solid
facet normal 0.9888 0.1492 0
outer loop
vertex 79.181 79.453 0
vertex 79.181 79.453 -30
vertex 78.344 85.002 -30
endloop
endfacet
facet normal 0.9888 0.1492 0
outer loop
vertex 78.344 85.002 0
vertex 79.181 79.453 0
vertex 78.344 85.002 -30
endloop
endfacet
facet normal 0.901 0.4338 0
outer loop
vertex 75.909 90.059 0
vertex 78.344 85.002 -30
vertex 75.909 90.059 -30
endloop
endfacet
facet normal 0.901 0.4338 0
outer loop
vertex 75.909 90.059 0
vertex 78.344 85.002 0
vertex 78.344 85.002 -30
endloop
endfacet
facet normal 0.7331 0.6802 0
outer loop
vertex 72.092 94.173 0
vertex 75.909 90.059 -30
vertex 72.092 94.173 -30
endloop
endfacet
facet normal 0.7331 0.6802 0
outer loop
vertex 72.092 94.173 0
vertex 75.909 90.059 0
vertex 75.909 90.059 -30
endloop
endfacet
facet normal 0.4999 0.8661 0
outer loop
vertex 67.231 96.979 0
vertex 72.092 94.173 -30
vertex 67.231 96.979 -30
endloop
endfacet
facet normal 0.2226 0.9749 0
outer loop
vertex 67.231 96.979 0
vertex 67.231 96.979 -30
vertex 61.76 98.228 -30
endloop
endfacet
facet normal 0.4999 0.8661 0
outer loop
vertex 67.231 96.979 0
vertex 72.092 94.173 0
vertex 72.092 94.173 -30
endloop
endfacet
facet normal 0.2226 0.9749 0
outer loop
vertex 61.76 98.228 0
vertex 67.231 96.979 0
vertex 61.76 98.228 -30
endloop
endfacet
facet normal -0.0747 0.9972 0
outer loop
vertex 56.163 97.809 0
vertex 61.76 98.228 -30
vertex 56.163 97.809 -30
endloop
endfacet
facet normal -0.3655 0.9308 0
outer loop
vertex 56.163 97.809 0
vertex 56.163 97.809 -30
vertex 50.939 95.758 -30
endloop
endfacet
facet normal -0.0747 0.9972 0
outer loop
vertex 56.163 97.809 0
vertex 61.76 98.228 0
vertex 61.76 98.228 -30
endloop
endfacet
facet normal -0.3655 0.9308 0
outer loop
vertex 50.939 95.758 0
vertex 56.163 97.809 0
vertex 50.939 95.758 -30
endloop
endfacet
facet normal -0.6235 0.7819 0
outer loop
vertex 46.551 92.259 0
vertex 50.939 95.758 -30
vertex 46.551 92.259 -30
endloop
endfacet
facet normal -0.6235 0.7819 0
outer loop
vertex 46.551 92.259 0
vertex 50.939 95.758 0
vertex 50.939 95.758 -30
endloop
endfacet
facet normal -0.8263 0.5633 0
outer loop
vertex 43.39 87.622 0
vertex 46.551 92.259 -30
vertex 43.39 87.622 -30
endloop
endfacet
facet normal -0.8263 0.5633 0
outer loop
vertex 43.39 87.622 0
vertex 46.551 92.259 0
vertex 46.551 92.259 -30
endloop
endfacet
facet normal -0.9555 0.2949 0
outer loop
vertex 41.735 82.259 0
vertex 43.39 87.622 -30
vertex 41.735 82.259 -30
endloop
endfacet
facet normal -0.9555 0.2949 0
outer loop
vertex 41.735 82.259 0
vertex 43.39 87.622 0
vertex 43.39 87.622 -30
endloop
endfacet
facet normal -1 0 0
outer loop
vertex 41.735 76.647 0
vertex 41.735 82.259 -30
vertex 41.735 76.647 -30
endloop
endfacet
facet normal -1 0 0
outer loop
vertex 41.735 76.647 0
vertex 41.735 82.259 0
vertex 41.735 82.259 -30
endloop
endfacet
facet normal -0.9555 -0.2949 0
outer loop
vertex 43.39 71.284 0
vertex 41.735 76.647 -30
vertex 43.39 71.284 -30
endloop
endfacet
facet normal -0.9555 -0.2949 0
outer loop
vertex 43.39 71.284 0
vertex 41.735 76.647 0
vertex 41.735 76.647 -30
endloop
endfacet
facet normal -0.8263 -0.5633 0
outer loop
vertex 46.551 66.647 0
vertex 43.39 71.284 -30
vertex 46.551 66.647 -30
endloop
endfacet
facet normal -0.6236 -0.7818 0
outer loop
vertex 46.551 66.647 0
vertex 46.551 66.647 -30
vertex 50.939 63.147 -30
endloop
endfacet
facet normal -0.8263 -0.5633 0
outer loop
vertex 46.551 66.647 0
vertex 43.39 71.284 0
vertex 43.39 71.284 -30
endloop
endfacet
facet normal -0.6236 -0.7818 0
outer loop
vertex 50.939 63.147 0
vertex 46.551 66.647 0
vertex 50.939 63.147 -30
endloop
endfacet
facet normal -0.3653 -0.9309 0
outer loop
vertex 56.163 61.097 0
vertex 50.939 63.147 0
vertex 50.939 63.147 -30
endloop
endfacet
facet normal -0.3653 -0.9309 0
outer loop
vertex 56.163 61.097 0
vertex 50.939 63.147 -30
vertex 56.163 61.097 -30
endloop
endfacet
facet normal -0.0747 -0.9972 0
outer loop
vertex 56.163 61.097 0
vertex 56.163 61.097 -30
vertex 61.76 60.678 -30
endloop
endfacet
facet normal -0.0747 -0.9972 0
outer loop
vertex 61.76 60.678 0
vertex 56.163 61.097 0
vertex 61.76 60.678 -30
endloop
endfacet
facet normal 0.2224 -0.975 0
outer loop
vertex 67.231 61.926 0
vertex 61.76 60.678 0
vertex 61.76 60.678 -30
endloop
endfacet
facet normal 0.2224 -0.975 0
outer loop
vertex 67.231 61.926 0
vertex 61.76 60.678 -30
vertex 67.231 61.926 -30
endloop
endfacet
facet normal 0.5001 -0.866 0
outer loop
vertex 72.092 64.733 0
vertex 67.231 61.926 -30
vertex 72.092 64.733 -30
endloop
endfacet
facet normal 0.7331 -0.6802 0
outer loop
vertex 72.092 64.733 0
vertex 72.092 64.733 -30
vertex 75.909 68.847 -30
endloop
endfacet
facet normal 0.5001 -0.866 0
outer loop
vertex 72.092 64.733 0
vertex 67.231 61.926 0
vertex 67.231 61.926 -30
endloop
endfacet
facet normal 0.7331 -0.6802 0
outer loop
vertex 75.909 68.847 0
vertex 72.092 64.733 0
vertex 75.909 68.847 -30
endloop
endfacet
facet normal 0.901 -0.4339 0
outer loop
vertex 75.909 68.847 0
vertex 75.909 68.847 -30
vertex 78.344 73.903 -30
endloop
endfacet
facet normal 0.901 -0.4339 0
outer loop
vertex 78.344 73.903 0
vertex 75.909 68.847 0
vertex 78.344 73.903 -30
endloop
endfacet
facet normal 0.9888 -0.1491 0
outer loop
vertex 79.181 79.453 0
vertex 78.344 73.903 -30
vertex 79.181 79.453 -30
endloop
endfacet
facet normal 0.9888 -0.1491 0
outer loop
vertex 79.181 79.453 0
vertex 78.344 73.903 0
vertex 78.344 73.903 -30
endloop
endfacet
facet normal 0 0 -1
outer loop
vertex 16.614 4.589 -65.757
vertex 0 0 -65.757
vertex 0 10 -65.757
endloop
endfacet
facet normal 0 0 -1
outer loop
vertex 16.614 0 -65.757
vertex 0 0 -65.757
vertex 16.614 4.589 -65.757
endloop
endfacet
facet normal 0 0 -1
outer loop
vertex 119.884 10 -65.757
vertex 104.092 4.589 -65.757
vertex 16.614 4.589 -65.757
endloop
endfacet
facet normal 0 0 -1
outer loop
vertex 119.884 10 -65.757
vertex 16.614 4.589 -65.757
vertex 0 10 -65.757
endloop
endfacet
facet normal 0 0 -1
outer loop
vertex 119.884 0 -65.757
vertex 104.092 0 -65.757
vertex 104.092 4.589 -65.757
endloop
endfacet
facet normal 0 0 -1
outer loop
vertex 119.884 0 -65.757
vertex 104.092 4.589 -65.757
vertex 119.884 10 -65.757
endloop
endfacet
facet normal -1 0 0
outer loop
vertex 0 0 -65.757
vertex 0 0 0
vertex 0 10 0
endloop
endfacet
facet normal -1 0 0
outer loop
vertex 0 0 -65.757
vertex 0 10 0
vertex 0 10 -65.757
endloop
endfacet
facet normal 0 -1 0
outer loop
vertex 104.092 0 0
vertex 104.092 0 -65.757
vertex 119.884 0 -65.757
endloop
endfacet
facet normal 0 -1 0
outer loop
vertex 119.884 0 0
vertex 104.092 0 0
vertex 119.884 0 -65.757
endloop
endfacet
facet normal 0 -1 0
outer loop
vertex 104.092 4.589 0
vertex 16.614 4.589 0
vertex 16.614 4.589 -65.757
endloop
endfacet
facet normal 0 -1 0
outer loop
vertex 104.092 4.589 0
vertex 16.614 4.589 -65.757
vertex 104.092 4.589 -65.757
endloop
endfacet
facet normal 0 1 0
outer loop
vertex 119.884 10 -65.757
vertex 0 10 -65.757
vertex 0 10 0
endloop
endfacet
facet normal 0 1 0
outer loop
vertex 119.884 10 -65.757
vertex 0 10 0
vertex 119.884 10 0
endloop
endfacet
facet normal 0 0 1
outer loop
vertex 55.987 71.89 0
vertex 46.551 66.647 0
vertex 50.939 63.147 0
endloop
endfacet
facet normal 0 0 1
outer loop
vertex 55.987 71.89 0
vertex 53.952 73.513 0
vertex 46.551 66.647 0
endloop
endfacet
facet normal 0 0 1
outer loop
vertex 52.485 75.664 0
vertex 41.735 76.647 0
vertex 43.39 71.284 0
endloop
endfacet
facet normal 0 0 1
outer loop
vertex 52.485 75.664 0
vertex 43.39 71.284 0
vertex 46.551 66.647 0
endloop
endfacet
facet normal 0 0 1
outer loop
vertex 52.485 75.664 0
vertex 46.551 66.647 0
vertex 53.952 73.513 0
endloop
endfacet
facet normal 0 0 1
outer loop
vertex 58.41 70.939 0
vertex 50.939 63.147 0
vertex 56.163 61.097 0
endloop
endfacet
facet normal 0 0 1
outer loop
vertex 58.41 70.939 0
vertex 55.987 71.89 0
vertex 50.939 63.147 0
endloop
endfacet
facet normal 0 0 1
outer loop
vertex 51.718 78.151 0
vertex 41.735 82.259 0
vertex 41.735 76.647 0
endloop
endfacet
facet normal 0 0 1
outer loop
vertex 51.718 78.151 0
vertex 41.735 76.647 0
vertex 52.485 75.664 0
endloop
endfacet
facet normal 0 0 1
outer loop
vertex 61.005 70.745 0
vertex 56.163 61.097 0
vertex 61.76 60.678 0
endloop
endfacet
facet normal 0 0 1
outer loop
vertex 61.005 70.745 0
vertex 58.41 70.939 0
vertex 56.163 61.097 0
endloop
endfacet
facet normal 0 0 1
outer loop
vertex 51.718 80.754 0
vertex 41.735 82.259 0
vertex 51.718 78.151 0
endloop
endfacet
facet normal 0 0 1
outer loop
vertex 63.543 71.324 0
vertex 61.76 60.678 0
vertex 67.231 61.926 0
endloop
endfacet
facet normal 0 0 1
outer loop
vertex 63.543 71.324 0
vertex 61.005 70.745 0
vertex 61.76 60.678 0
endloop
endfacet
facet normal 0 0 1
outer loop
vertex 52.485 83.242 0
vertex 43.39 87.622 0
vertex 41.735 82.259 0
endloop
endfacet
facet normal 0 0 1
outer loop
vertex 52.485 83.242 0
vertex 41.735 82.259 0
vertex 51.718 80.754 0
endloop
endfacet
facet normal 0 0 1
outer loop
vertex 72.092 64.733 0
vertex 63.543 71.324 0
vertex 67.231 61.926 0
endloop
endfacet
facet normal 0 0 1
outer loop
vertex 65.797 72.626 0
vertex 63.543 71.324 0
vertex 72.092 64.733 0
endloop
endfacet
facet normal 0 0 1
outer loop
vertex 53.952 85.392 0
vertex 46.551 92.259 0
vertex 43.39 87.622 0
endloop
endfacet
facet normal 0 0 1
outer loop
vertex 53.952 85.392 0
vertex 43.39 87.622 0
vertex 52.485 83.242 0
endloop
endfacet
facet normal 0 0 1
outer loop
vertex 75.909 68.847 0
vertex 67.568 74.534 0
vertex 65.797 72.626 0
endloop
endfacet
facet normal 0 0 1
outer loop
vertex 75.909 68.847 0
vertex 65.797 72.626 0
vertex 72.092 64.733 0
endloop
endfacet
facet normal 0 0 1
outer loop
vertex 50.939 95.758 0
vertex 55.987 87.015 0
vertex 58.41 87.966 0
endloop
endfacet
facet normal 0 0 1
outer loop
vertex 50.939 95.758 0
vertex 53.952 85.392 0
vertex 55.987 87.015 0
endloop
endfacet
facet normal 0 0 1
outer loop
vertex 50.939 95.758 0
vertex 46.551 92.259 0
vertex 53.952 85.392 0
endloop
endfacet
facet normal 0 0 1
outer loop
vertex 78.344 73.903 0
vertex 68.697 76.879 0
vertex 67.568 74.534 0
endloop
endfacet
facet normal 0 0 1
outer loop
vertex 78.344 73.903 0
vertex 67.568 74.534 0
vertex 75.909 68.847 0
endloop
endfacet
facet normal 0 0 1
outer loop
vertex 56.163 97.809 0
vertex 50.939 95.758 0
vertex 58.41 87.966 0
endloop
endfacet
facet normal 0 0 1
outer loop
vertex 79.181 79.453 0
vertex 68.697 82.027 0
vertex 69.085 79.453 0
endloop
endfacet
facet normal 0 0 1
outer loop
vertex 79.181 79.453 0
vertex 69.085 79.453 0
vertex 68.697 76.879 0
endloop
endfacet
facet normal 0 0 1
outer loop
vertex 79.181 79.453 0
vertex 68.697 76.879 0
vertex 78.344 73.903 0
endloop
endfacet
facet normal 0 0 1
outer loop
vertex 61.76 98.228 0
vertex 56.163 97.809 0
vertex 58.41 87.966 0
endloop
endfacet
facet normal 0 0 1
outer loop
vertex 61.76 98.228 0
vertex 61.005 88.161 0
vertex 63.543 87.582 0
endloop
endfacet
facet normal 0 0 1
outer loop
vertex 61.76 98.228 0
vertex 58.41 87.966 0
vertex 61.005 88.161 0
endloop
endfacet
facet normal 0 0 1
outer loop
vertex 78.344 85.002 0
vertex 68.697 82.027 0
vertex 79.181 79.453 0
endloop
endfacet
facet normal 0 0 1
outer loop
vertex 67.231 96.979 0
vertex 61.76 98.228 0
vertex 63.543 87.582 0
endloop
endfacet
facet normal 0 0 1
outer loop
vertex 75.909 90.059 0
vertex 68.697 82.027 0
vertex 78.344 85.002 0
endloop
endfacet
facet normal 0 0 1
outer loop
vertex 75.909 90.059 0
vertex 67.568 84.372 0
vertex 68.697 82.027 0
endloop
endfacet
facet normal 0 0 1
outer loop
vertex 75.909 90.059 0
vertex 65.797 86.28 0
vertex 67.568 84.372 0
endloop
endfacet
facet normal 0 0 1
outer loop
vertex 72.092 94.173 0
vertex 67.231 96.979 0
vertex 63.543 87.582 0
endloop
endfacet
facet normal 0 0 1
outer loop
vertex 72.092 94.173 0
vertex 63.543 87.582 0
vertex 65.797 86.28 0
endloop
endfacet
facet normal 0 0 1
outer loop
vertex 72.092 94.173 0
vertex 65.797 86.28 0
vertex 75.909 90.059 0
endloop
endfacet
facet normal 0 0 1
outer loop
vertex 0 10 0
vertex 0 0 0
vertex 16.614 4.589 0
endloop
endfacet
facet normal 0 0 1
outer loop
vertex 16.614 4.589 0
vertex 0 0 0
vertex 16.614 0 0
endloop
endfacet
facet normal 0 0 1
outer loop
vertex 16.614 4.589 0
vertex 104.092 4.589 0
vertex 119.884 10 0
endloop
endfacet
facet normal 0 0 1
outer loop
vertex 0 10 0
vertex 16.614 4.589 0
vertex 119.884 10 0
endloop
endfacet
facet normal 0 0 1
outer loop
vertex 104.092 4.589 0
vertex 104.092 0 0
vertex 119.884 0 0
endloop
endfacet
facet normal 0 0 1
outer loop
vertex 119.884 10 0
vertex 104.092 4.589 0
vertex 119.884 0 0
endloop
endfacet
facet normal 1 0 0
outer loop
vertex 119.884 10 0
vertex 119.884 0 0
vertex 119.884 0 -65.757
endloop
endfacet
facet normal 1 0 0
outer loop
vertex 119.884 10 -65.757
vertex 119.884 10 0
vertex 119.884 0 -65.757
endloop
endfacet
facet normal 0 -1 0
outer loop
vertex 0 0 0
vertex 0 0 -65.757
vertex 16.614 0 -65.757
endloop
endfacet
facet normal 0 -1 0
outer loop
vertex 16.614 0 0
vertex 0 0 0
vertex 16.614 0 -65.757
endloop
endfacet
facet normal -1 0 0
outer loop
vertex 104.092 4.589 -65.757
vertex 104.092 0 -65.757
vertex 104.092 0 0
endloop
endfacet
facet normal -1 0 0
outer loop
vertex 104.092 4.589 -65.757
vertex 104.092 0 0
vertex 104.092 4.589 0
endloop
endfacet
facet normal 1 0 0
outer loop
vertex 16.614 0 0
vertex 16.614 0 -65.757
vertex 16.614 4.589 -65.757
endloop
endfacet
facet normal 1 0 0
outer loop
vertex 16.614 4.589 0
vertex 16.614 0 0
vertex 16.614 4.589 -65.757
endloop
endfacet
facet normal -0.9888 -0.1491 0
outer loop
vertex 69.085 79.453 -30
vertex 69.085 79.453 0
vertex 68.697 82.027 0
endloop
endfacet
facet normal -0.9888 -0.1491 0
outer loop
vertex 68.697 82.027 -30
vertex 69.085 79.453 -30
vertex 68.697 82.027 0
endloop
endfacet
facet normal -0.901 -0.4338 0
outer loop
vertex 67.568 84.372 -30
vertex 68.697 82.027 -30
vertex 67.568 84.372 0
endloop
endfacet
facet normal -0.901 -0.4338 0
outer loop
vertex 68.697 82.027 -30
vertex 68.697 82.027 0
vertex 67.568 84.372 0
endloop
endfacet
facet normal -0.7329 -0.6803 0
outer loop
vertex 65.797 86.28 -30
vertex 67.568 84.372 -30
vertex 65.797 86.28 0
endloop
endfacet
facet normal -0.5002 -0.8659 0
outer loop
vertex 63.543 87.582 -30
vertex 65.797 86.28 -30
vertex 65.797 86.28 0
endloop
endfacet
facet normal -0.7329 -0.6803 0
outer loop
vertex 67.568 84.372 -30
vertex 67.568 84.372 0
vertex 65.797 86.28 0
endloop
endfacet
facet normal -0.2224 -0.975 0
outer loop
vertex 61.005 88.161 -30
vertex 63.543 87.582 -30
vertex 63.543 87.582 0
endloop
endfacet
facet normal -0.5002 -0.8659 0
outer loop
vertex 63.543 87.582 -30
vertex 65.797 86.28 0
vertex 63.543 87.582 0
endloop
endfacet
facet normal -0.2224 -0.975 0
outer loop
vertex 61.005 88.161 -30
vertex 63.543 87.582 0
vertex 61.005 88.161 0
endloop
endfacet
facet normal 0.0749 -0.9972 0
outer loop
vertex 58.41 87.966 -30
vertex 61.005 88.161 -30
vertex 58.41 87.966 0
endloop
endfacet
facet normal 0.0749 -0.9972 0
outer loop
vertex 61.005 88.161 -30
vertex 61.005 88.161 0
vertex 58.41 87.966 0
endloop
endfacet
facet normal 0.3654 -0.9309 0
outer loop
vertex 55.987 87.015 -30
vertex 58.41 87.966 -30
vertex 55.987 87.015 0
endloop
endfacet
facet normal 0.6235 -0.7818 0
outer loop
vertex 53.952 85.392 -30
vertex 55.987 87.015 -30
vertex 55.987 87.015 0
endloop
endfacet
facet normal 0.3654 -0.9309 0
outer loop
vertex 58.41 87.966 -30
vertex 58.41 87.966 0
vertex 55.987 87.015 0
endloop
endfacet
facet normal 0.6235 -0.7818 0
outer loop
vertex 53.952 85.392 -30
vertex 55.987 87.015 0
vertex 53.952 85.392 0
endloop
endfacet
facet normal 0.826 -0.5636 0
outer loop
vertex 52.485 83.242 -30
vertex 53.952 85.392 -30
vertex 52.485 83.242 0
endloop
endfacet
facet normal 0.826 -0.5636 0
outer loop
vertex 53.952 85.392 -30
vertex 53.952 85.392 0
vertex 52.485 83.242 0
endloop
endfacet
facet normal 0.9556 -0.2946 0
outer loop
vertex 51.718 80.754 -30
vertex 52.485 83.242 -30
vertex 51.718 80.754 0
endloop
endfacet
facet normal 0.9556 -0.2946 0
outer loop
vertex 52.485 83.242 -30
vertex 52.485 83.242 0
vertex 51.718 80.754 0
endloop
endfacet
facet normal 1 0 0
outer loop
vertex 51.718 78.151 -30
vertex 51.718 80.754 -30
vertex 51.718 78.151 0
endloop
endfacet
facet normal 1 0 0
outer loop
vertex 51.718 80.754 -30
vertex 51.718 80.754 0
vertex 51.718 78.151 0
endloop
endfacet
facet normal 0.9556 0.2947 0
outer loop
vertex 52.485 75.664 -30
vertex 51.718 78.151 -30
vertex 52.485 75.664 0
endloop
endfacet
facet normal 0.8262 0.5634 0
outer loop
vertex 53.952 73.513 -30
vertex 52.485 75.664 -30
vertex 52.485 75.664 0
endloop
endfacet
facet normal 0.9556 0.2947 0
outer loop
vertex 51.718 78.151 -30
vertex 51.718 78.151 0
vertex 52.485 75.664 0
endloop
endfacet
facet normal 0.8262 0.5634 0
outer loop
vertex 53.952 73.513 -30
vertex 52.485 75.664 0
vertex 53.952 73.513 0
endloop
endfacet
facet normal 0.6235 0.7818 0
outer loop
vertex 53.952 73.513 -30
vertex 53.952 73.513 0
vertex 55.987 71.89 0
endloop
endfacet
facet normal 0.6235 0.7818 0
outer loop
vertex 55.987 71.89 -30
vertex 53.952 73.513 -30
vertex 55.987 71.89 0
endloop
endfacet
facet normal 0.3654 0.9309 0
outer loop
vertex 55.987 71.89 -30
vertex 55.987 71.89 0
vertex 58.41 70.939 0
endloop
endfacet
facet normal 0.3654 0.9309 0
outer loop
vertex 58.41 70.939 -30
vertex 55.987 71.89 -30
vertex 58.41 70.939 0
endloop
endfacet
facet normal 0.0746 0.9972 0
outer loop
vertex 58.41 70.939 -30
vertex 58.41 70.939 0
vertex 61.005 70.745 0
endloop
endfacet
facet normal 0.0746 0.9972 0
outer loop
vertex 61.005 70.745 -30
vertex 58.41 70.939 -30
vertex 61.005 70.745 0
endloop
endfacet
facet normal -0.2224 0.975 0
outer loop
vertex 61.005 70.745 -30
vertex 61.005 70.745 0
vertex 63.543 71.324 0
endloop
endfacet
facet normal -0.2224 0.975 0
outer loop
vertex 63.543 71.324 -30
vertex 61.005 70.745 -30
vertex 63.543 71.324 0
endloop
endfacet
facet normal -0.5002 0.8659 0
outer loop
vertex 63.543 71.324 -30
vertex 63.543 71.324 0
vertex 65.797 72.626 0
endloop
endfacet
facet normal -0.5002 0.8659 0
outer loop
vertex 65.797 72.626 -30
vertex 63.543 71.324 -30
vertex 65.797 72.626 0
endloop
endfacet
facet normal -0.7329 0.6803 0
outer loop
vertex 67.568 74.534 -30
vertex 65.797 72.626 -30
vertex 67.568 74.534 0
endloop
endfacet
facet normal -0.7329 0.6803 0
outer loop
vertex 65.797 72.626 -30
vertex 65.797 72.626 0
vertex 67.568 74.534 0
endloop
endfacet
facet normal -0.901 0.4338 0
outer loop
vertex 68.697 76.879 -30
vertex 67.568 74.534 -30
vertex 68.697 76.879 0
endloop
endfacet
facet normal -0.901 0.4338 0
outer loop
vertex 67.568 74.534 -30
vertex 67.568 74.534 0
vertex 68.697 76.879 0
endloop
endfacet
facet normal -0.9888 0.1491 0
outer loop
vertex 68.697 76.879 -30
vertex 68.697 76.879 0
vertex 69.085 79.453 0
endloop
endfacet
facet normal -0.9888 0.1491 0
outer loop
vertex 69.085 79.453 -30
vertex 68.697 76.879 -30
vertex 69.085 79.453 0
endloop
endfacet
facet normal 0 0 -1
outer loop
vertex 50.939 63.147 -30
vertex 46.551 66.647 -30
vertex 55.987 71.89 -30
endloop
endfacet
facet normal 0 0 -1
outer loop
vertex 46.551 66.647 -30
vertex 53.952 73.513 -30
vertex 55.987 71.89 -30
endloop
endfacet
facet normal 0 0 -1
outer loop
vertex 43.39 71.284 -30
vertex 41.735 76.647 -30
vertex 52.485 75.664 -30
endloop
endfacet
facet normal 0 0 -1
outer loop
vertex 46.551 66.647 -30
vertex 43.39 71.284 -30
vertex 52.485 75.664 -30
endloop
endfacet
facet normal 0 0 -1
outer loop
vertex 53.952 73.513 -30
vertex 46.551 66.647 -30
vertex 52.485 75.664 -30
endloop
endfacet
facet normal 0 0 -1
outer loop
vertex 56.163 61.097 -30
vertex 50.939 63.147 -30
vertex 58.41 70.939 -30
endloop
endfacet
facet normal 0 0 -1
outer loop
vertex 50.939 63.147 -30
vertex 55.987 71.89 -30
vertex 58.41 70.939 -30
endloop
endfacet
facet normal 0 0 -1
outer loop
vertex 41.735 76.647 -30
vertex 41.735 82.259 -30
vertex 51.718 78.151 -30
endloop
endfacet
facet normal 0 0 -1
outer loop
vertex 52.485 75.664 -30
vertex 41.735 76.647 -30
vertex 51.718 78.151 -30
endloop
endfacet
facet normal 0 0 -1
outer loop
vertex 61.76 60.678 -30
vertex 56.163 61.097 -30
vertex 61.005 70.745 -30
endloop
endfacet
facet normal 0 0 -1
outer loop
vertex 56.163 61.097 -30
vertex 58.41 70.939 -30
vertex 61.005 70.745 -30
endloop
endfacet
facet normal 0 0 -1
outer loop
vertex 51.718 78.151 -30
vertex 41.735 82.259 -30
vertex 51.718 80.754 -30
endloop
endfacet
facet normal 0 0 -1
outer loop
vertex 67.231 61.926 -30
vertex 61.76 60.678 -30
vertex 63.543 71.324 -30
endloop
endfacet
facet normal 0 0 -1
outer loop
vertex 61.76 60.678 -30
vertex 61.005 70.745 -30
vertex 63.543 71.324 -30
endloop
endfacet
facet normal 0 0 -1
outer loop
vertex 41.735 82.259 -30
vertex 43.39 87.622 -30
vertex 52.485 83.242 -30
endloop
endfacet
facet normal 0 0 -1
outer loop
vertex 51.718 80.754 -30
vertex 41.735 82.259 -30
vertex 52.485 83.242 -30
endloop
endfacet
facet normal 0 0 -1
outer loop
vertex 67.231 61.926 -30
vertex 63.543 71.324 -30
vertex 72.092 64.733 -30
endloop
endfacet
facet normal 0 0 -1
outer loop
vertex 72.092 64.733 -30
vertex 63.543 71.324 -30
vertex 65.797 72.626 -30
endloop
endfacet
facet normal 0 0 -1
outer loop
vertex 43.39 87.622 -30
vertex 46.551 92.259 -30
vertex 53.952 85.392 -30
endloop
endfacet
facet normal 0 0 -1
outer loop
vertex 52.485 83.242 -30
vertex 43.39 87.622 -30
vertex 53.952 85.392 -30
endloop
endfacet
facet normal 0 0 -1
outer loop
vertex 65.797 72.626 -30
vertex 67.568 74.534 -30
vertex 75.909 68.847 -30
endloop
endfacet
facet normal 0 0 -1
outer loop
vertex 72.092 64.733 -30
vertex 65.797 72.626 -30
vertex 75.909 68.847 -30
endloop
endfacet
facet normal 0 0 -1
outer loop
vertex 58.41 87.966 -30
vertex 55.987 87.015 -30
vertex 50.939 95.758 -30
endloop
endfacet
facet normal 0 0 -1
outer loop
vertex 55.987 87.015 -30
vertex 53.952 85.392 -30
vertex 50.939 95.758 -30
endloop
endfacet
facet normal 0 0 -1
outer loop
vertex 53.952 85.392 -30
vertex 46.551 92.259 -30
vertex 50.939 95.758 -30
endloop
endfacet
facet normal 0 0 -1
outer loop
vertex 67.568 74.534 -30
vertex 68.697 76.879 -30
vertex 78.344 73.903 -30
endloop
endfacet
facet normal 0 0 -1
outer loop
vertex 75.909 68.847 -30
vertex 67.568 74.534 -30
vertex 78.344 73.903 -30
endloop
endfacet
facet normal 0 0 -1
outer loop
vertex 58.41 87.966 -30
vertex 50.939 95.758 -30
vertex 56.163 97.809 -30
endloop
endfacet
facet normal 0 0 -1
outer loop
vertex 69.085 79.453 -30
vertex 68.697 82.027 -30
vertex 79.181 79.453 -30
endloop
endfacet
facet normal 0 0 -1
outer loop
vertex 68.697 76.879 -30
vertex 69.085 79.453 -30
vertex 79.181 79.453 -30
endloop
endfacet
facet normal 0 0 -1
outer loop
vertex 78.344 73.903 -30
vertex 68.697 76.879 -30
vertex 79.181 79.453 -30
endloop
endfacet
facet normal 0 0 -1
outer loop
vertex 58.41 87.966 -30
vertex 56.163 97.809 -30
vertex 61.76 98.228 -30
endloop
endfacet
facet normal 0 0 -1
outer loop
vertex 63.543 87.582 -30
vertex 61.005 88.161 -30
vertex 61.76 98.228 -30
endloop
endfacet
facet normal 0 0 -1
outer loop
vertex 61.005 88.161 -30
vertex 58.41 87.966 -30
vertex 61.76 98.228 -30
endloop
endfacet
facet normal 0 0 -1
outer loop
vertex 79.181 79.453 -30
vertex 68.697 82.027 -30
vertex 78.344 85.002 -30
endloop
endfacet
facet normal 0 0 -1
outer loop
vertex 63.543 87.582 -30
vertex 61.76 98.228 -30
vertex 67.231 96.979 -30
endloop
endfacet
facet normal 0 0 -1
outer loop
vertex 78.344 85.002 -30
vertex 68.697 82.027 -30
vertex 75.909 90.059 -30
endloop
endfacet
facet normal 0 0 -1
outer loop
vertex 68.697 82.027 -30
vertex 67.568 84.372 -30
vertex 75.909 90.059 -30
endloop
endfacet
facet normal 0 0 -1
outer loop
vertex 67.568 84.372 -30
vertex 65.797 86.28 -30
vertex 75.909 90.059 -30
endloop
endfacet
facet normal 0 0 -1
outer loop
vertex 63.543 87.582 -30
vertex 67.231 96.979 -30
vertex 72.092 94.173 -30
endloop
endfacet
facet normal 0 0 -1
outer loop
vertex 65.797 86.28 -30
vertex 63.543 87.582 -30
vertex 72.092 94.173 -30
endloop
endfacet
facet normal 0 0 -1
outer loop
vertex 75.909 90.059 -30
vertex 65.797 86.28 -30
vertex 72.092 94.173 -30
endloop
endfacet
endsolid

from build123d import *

# Parameters (mm, degrees)
SKETCH_1_W          = 119.884331053
SKETCH_1_H          = 65.756914518
EXTRUDE_1_DEPTH     = 10
SKETCH_2_W          = 87.478296183
SKETCH_2_H          = 12.183988045
CUT_EXTRUDE_1_DEPTH = 105
SKETCH_3_R          = 18.827887846
SKETCH_3_R_2        = 8.732446569
EXTRUDE_2_DEPTH     = 30


with BuildPart() as part:
    # 草图1 → 凸台-拉伸1 (new body)
    with BuildSketch(Plane(origin=(0, 0, 0), x_dir=(1, 0, 0), z_dir=(0, 1, 0))):
        with Locations((59.942165527, 32.878457259)):
            Rectangle(SKETCH_1_W, SKETCH_1_H)
    extrude(amount=EXTRUDE_1_DEPTH)

    # 草图2 → 切除-拉伸1 (cut)
    with BuildSketch(Plane.XY):
        with Locations((60.352861753, -1.502690248)):
            Rectangle(SKETCH_2_W, SKETCH_2_H)
    extrude(amount=-CUT_EXTRUDE_1_DEPTH, mode=Mode.SUBTRACT)


with BuildPart() as body_2:
    # 草图3 → 凸台-拉伸2 (new body)
    with BuildSketch(Plane.XY):
        with Locations((60.352861753, 79.45286153)):
            Circle(SKETCH_3_R)
        with Locations((60.352861753, 79.45286153)):
            Circle(SKETCH_3_R_2, mode=Mode.SUBTRACT)
    extrude(amount=-EXTRUDE_2_DEPTH)


solid = Compound([part.part, body_2.part])
